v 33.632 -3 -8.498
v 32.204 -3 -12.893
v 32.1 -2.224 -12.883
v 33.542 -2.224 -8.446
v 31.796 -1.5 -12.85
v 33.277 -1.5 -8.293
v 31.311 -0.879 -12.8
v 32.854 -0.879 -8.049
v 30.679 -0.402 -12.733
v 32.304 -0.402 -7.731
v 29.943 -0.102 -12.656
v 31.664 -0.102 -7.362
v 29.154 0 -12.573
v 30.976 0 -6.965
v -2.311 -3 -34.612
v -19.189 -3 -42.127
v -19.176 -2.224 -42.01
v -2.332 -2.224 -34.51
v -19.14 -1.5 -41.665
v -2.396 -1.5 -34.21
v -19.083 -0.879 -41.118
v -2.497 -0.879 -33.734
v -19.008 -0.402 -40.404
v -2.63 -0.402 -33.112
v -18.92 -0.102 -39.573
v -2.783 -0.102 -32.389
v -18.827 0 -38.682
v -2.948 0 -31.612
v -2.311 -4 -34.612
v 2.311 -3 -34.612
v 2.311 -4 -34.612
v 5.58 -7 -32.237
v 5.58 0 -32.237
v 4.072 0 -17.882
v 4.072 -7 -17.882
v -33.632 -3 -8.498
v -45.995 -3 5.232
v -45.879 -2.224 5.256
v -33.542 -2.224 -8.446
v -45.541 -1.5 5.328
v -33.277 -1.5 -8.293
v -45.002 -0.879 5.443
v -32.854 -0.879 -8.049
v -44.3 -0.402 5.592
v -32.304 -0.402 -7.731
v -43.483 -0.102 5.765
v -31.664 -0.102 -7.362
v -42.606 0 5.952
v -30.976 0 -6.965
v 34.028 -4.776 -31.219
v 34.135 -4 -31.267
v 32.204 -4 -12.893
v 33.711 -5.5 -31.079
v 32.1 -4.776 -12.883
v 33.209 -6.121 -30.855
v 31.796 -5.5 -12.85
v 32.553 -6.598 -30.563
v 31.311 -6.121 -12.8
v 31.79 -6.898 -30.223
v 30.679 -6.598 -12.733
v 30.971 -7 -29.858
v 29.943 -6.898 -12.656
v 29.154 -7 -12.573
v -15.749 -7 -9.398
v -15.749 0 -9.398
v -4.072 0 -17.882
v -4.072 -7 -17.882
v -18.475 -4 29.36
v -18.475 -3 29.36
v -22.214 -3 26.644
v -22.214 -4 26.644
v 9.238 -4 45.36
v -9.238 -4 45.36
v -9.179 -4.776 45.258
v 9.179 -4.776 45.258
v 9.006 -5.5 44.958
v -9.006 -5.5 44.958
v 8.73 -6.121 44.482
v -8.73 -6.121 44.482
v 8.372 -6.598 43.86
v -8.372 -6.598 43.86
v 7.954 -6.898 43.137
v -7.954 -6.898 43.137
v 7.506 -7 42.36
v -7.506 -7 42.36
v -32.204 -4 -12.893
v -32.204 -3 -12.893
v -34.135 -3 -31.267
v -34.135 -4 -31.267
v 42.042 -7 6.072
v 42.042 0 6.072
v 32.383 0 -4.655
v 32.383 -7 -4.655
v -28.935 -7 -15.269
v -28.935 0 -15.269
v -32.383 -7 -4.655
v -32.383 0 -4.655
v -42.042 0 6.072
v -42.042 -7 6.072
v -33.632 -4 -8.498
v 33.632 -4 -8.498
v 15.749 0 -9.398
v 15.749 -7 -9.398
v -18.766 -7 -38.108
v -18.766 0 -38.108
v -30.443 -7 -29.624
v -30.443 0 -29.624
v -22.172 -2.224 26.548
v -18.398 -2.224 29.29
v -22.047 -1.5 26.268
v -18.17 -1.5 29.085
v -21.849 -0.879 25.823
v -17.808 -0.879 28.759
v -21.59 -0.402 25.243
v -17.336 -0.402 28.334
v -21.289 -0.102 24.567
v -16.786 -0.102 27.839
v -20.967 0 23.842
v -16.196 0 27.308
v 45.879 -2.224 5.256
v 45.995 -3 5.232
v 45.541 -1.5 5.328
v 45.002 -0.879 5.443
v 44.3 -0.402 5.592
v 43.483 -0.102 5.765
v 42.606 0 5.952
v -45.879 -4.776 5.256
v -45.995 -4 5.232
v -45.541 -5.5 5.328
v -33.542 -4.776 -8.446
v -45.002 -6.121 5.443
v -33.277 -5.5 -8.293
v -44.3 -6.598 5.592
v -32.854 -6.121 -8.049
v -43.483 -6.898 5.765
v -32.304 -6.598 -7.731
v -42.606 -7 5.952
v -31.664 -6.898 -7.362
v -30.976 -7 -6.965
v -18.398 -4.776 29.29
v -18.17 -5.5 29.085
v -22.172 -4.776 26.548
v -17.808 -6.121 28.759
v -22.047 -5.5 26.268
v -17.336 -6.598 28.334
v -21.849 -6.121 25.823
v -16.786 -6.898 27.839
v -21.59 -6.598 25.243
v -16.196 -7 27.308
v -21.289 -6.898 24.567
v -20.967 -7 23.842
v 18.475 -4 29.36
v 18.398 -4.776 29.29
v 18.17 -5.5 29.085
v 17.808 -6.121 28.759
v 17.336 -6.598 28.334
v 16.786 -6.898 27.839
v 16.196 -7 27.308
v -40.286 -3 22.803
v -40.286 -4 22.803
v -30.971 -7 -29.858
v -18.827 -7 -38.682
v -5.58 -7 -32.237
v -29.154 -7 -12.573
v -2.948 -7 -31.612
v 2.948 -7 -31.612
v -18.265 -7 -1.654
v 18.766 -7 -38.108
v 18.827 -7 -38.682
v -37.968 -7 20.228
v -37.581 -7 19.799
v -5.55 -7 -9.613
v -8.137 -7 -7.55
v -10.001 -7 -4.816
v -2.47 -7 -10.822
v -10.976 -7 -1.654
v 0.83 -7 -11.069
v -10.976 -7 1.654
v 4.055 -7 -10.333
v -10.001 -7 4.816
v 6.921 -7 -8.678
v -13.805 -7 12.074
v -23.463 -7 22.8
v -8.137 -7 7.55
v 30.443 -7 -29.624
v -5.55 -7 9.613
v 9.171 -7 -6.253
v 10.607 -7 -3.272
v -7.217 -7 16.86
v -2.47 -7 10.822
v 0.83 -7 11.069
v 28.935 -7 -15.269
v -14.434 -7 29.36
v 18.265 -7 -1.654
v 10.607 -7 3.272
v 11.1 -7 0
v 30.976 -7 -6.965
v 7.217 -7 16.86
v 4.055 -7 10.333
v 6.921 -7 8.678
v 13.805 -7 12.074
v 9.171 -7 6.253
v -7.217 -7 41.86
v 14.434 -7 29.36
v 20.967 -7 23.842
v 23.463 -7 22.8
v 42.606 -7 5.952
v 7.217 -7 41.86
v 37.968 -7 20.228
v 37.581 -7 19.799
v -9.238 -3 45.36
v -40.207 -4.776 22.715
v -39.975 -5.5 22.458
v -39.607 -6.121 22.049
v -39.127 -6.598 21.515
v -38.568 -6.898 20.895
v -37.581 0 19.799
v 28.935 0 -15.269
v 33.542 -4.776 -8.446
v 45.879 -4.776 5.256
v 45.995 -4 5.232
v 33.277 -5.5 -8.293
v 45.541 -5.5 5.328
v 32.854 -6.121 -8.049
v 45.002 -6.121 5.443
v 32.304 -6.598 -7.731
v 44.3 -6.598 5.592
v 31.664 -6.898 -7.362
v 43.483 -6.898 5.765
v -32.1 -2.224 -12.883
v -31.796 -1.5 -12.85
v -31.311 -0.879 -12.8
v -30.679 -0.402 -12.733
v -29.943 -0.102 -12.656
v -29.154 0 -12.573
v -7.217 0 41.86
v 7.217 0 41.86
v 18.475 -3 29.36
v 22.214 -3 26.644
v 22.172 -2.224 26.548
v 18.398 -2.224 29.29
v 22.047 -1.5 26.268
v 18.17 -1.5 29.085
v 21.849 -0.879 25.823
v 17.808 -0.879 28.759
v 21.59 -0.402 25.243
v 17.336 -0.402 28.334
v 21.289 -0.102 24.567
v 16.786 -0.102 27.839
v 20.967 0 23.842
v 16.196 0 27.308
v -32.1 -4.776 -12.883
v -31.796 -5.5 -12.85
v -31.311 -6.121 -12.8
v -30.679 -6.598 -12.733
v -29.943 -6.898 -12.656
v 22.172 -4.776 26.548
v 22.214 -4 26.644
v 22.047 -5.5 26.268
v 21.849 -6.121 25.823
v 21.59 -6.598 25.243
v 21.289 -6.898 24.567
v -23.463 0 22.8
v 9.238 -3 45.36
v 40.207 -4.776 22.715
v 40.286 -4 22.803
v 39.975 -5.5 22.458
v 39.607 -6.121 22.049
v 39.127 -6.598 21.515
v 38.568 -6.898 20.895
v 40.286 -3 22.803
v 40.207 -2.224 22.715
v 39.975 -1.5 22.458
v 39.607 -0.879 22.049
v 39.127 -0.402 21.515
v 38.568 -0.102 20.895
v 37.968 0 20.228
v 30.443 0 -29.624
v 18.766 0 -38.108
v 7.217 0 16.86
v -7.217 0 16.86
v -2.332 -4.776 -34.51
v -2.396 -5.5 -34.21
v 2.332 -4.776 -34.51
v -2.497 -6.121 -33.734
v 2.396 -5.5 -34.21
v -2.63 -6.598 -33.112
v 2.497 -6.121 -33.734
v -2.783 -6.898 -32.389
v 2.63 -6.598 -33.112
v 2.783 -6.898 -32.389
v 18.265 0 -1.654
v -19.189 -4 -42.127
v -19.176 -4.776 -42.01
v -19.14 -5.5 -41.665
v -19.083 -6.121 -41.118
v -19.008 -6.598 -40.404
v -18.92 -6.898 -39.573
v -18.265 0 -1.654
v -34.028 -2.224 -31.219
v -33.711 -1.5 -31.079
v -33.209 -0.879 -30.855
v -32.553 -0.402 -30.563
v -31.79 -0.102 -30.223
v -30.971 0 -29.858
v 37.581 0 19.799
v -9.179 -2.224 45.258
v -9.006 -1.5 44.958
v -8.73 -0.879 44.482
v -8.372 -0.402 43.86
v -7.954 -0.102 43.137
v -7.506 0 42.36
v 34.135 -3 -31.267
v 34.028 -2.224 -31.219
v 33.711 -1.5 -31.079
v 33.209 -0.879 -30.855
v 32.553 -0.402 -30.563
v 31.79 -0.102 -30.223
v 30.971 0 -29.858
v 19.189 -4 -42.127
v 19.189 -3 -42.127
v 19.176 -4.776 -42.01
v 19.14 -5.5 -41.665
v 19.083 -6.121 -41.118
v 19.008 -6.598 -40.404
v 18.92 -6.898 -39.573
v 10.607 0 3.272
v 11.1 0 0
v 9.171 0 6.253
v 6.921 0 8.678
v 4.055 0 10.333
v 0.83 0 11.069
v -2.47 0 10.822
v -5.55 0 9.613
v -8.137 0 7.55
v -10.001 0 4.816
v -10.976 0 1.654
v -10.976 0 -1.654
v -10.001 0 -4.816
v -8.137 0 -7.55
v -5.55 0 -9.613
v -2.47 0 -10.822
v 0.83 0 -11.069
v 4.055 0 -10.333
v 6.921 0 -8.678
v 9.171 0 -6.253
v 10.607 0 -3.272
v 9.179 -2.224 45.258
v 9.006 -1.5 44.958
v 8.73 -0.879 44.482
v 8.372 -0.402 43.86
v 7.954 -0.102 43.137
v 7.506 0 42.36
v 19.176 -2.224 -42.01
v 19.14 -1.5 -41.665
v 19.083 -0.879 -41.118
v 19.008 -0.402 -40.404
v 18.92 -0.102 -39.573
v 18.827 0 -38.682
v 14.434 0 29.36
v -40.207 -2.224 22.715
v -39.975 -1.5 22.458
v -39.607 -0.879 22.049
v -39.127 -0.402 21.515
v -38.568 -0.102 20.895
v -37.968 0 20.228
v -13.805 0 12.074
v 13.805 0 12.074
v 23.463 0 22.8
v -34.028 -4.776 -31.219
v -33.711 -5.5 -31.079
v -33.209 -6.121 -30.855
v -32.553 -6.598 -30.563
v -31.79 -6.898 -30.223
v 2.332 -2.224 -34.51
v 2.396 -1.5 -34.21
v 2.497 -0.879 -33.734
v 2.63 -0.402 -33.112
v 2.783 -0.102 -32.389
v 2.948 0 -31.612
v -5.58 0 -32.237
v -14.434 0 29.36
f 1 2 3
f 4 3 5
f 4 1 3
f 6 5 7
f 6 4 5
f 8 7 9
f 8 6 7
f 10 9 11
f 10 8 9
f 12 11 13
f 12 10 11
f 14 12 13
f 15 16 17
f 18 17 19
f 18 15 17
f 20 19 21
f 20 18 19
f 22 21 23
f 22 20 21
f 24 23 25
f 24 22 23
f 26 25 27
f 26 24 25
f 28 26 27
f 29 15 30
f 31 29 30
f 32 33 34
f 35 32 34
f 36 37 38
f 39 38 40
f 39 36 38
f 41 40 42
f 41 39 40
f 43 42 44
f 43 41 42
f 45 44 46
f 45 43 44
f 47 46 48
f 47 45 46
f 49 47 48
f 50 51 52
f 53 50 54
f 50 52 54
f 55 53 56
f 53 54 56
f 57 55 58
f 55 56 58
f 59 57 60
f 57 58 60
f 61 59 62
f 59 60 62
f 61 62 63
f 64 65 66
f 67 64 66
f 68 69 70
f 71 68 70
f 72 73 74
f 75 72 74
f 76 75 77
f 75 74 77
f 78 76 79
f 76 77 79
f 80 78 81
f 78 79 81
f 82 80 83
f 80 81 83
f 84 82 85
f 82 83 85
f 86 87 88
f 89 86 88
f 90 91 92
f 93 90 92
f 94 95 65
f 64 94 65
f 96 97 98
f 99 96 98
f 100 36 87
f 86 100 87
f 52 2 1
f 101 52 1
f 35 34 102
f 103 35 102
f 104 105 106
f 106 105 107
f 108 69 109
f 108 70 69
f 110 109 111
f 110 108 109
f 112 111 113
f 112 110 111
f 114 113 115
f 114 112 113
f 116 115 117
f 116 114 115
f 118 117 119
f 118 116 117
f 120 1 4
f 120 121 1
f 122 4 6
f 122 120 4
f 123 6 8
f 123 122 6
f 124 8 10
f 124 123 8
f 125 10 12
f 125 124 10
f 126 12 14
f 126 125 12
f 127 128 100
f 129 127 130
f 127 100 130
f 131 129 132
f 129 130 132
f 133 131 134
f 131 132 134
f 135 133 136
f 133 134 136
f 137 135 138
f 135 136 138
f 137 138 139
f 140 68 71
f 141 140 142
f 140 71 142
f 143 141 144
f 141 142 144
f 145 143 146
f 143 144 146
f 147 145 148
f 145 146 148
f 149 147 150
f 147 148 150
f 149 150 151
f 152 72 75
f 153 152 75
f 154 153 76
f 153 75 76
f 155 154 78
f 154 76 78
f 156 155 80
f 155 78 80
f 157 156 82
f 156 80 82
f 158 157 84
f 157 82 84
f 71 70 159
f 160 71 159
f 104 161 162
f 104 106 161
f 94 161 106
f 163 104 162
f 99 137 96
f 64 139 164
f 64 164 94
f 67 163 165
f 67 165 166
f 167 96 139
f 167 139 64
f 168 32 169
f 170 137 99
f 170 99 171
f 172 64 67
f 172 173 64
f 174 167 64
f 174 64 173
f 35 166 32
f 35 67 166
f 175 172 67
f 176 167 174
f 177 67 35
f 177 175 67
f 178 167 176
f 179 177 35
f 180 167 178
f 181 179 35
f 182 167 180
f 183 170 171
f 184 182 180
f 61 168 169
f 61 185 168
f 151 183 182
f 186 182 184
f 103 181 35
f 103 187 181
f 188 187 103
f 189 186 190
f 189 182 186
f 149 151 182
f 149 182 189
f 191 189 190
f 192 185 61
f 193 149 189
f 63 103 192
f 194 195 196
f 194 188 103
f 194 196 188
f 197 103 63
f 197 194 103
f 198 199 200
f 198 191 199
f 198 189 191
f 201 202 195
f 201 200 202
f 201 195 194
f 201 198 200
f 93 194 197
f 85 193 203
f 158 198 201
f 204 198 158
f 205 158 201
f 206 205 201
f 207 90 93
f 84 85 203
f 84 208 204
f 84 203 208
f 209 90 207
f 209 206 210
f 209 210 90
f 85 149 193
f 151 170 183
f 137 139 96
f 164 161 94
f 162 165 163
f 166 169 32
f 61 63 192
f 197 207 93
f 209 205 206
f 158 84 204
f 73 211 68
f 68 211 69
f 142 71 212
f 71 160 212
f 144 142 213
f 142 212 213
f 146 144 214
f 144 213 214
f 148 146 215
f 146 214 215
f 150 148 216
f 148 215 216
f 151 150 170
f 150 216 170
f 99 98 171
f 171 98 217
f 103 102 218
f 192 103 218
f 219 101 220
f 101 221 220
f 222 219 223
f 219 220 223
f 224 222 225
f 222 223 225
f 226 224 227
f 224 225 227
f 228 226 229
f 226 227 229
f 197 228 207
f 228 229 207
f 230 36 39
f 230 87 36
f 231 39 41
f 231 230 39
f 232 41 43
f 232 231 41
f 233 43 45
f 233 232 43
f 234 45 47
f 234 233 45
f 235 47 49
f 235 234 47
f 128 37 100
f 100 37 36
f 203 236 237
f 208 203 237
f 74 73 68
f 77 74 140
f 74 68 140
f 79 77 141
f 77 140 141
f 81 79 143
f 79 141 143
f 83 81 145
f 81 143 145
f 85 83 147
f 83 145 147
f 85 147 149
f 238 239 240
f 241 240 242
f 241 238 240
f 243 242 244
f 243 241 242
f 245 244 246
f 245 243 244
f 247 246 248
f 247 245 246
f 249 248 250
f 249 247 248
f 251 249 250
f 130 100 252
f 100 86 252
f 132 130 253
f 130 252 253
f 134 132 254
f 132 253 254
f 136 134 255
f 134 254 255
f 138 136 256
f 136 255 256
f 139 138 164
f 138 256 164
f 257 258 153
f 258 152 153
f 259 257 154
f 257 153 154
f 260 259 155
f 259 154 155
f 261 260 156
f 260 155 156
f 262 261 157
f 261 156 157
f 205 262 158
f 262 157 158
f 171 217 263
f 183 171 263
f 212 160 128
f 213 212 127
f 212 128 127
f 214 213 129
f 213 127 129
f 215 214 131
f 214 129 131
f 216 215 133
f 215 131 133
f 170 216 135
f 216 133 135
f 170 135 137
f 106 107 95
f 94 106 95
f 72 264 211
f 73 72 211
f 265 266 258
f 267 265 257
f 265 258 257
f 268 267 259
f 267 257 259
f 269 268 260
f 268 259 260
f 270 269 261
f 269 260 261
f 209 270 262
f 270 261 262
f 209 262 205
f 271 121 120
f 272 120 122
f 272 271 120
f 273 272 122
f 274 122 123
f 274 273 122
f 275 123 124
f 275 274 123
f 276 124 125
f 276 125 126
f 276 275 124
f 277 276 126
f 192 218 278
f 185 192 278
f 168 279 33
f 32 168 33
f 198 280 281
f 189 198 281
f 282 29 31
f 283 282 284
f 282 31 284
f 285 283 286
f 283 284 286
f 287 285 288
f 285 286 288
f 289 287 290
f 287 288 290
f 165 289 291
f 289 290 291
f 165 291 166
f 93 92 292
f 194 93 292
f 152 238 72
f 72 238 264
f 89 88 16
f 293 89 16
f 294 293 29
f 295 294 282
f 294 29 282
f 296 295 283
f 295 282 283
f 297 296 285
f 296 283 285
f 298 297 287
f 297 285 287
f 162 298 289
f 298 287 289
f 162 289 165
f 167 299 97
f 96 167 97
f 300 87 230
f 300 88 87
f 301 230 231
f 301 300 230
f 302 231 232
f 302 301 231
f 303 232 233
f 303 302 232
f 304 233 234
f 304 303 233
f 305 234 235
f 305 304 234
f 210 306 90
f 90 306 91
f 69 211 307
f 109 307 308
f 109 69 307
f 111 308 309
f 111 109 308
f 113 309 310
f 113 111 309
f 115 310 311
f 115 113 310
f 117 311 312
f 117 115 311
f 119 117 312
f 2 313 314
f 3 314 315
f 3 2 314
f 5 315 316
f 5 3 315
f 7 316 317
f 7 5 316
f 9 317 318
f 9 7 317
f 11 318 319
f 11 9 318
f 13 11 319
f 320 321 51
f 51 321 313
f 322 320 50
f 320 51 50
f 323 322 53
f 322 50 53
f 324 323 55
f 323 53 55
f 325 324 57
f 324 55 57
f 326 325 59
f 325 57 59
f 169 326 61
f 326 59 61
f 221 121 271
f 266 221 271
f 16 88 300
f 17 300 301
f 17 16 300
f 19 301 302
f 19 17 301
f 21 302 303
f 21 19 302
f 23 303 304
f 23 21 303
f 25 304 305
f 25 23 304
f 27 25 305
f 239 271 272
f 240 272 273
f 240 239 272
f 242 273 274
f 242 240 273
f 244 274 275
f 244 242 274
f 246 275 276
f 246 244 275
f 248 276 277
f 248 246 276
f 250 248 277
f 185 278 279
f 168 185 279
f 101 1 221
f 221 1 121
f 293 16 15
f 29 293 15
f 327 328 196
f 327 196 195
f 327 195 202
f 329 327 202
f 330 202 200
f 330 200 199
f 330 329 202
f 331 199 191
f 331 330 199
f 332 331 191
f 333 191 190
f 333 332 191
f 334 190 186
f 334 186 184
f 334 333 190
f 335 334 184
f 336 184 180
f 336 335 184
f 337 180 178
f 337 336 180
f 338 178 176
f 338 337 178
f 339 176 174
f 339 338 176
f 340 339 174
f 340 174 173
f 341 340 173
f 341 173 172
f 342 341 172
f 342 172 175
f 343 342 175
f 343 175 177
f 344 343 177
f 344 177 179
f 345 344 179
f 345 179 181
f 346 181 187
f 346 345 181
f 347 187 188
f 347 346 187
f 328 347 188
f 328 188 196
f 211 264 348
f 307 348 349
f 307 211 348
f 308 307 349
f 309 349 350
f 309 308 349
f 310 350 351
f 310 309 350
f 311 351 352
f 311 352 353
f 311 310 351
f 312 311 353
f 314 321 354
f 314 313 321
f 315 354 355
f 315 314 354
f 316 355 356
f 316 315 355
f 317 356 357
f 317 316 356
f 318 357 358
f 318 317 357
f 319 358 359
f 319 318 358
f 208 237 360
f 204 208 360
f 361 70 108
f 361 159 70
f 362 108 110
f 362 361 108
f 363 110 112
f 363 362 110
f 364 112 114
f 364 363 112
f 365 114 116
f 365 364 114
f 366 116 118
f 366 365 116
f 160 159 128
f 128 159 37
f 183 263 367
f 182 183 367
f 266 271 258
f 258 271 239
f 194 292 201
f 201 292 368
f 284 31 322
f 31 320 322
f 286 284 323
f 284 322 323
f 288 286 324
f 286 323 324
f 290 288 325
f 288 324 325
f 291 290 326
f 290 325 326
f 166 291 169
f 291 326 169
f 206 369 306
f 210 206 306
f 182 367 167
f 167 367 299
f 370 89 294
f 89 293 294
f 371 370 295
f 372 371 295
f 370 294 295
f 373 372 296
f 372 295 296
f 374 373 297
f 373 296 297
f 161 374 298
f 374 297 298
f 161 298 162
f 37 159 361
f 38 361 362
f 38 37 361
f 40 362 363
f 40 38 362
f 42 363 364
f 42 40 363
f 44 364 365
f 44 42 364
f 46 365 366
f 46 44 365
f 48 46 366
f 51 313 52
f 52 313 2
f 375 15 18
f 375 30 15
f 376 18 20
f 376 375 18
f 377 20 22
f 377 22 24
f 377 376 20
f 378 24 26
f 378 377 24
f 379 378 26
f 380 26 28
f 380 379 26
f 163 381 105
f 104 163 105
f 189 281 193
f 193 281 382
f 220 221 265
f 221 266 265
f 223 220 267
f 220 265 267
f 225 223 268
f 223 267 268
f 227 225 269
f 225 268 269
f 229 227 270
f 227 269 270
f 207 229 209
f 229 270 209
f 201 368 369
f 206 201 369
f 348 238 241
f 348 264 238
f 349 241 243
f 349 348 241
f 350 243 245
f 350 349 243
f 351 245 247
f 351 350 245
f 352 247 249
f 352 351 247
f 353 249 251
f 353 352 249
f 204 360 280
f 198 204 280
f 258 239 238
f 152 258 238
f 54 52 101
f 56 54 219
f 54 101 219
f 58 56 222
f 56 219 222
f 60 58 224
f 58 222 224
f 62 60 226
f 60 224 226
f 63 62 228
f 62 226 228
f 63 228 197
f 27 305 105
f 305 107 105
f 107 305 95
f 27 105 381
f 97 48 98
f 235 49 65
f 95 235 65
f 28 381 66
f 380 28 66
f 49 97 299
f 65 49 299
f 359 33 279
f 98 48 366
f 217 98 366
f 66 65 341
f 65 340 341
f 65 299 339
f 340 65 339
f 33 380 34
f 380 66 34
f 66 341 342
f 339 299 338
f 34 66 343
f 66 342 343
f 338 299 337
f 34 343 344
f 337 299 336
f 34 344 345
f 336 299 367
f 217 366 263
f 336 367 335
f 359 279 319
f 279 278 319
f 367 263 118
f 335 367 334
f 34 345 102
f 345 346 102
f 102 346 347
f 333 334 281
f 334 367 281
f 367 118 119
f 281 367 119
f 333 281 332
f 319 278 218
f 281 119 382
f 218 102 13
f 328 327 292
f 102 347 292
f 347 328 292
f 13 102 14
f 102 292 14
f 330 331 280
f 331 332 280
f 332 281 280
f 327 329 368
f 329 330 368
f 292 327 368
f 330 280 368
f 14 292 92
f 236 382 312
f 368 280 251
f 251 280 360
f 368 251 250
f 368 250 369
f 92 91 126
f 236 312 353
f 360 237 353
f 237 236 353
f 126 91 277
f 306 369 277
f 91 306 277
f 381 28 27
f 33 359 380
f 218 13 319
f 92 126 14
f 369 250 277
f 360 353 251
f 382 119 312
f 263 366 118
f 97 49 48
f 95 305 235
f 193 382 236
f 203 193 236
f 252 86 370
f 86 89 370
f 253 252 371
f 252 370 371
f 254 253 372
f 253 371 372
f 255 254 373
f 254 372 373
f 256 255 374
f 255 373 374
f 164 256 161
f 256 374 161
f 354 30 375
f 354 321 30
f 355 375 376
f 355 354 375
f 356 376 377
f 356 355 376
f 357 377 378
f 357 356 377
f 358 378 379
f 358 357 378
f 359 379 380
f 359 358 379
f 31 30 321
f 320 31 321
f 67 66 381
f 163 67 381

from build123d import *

# Parameters (mm, degrees)
F0_R     = 12.251715
F0_R_2   = 11.1
F1_DEPTH = 7
F2_R     = 3


with BuildPart() as f1:
    # F0 (on Front) → F1 (new body)
    with BuildSketch(Plane.XZ):
        Polygon((18.475209, 29.36019), (9.237604, 13.36019), (-9.237604, 13.36019), (-18.475209, 29.36019), (-22.214047, 26.643765), (-9.851719, 12.91401), (-15.560873, -4.656958), (-33.632353, -8.49817), (-32.204244, -12.893438), (-15.326302, -5.378893), (-0.379544, -16.238348), (-2.310729, -34.612348), (2.310729, -34.612348), (0.379544, -16.238348), (15.326302, -5.378893), (32.204244, -12.893438), (33.632353, -8.49817), (15.560873, -4.656958), (9.851719, 12.91401), (22.214047, 26.643765), align=None)
        Circle(F0_R, mode=Mode.SUBTRACT)
        Polygon((-9.237604, 13.36019), (9.237604, 13.36019), (18.475209, 29.36019), (9.237604, 45.36019), (-9.237604, 45.36019), (-18.475209, 29.36019), align=None)
        Polygon((14.433757, 29.36019), (7.216878, 16.86019), (-7.216878, 16.86019), (-14.433757, 29.36019), (-7.216878, 41.86019), (7.216878, 41.86019), align=None, mode=Mode.SUBTRACT)
        Polygon((40.285528, 22.802553), (22.214047, 26.643765), (9.851719, 12.91401), (15.560873, -4.656958), (33.632353, -8.49817), (45.994681, 5.231586), align=None)
        Polygon((13.804856, 12.073744), (23.462924, 22.800116), (37.581268, 19.799169), (42.041545, 6.071851), (32.383476, -4.654521), (18.265132, -1.653574), align=None, mode=Mode.SUBTRACT)
        Polygon((-9.851719, 12.91401), (-22.214047, 26.643765), (-40.285528, 22.802553), (-45.994681, 5.231586), (-33.632353, -8.49817), (-15.560873, -4.656958), align=None)
        Polygon((-18.265132, -1.653574), (-32.383476, -4.654521), (-42.041545, 6.071851), (-37.581268, 19.799169), (-23.462924, 22.800116), (-13.804856, 12.073744), align=None, mode=Mode.SUBTRACT)
        Polygon((34.13543, -31.267437), (32.204244, -12.893438), (15.326302, -5.378893), (0.379544, -16.238348), (2.310729, -34.612348), (19.188672, -42.126892), align=None)
        Polygon((15.748748, -9.398206), (28.934641, -15.268943), (30.44338, -29.62363), (18.766225, -38.10758), (5.580332, -32.236842), (4.071594, -17.882155), align=None, mode=Mode.SUBTRACT)
        Polygon((-15.326302, -5.378893), (-32.204244, -12.893438), (-34.13543, -31.267437), (-19.188672, -42.126892), (-2.310729, -34.612348), (-0.379544, -16.238348), align=None)
        Polygon((-4.071594, -17.882155), (-5.580332, -32.236842), (-18.766225, -38.10758), (-30.44338, -29.62363), (-28.934641, -15.268943), (-15.748748, -9.398206), align=None, mode=Mode.SUBTRACT)
        Circle(F0_R)
        Circle(F0_R_2, mode=Mode.SUBTRACT)
    extrude(amount=F1_DEPTH)

    # F2
    f2_edges = [f1.edges().sort_by_distance(p)[0] for p in [
        (0, -7, 45.36019),
        (13.856406, -7, 37.36019),
        (31.249787, -7, 24.723159),
        (20.344628, -7, 28.001978),
        (43.140104, -7, 14.01707),
        (39.813517, -7, -1.633292),
        (33.169837, -7, -22.080437),
        (32.918299, -7, -10.695804),
        (26.662051, -7, -36.697165),
        (10.7497, -7, -38.36962),
        (-10.7497, -7, -38.36962),
        (0, -7, -34.612348),
        (-26.662051, -7, -36.697165),
        (-33.169837, -7, -22.080437),
        (-32.918299, -7, -10.695804),
        (-43.140104, -7, 14.01707),
        (-39.813517, -7, -1.633292),
        (-31.249787, -7, 24.723159),
        (-20.344628, -7, 28.001978),
        (-13.856406, -7, 37.36019),
        (-26.662051, 0, -36.697165),
        (-10.7497, 0, -38.36962),
        (0, 0, -34.612348),
        (10.7497, 0, -38.36962),
        (26.662051, 0, -36.697165),
        (33.169837, 0, -22.080437),
        (39.813517, 0, -1.633292),
        (43.140104, 0, 14.01707),
        (31.249787, 0, 24.723159),
        (32.918299, 0, -10.695804),
        (20.344628, 0, 28.001978),
        (13.856406, 0, 37.36019),
        (0, 0, 45.36019),
        (-13.856406, 0, 37.36019),
        (-20.344628, 0, 28.001978),
        (-31.249787, 0, 24.723159),
        (-43.140104, 0, 14.01707),
        (-33.169837, 0, -22.080437),
        (-39.813517, 0, -1.633292),
        (-32.918299, 0, -10.695804),
    ]]
    fillet(f2_edges, radius=F2_R)


solid = f1.part
